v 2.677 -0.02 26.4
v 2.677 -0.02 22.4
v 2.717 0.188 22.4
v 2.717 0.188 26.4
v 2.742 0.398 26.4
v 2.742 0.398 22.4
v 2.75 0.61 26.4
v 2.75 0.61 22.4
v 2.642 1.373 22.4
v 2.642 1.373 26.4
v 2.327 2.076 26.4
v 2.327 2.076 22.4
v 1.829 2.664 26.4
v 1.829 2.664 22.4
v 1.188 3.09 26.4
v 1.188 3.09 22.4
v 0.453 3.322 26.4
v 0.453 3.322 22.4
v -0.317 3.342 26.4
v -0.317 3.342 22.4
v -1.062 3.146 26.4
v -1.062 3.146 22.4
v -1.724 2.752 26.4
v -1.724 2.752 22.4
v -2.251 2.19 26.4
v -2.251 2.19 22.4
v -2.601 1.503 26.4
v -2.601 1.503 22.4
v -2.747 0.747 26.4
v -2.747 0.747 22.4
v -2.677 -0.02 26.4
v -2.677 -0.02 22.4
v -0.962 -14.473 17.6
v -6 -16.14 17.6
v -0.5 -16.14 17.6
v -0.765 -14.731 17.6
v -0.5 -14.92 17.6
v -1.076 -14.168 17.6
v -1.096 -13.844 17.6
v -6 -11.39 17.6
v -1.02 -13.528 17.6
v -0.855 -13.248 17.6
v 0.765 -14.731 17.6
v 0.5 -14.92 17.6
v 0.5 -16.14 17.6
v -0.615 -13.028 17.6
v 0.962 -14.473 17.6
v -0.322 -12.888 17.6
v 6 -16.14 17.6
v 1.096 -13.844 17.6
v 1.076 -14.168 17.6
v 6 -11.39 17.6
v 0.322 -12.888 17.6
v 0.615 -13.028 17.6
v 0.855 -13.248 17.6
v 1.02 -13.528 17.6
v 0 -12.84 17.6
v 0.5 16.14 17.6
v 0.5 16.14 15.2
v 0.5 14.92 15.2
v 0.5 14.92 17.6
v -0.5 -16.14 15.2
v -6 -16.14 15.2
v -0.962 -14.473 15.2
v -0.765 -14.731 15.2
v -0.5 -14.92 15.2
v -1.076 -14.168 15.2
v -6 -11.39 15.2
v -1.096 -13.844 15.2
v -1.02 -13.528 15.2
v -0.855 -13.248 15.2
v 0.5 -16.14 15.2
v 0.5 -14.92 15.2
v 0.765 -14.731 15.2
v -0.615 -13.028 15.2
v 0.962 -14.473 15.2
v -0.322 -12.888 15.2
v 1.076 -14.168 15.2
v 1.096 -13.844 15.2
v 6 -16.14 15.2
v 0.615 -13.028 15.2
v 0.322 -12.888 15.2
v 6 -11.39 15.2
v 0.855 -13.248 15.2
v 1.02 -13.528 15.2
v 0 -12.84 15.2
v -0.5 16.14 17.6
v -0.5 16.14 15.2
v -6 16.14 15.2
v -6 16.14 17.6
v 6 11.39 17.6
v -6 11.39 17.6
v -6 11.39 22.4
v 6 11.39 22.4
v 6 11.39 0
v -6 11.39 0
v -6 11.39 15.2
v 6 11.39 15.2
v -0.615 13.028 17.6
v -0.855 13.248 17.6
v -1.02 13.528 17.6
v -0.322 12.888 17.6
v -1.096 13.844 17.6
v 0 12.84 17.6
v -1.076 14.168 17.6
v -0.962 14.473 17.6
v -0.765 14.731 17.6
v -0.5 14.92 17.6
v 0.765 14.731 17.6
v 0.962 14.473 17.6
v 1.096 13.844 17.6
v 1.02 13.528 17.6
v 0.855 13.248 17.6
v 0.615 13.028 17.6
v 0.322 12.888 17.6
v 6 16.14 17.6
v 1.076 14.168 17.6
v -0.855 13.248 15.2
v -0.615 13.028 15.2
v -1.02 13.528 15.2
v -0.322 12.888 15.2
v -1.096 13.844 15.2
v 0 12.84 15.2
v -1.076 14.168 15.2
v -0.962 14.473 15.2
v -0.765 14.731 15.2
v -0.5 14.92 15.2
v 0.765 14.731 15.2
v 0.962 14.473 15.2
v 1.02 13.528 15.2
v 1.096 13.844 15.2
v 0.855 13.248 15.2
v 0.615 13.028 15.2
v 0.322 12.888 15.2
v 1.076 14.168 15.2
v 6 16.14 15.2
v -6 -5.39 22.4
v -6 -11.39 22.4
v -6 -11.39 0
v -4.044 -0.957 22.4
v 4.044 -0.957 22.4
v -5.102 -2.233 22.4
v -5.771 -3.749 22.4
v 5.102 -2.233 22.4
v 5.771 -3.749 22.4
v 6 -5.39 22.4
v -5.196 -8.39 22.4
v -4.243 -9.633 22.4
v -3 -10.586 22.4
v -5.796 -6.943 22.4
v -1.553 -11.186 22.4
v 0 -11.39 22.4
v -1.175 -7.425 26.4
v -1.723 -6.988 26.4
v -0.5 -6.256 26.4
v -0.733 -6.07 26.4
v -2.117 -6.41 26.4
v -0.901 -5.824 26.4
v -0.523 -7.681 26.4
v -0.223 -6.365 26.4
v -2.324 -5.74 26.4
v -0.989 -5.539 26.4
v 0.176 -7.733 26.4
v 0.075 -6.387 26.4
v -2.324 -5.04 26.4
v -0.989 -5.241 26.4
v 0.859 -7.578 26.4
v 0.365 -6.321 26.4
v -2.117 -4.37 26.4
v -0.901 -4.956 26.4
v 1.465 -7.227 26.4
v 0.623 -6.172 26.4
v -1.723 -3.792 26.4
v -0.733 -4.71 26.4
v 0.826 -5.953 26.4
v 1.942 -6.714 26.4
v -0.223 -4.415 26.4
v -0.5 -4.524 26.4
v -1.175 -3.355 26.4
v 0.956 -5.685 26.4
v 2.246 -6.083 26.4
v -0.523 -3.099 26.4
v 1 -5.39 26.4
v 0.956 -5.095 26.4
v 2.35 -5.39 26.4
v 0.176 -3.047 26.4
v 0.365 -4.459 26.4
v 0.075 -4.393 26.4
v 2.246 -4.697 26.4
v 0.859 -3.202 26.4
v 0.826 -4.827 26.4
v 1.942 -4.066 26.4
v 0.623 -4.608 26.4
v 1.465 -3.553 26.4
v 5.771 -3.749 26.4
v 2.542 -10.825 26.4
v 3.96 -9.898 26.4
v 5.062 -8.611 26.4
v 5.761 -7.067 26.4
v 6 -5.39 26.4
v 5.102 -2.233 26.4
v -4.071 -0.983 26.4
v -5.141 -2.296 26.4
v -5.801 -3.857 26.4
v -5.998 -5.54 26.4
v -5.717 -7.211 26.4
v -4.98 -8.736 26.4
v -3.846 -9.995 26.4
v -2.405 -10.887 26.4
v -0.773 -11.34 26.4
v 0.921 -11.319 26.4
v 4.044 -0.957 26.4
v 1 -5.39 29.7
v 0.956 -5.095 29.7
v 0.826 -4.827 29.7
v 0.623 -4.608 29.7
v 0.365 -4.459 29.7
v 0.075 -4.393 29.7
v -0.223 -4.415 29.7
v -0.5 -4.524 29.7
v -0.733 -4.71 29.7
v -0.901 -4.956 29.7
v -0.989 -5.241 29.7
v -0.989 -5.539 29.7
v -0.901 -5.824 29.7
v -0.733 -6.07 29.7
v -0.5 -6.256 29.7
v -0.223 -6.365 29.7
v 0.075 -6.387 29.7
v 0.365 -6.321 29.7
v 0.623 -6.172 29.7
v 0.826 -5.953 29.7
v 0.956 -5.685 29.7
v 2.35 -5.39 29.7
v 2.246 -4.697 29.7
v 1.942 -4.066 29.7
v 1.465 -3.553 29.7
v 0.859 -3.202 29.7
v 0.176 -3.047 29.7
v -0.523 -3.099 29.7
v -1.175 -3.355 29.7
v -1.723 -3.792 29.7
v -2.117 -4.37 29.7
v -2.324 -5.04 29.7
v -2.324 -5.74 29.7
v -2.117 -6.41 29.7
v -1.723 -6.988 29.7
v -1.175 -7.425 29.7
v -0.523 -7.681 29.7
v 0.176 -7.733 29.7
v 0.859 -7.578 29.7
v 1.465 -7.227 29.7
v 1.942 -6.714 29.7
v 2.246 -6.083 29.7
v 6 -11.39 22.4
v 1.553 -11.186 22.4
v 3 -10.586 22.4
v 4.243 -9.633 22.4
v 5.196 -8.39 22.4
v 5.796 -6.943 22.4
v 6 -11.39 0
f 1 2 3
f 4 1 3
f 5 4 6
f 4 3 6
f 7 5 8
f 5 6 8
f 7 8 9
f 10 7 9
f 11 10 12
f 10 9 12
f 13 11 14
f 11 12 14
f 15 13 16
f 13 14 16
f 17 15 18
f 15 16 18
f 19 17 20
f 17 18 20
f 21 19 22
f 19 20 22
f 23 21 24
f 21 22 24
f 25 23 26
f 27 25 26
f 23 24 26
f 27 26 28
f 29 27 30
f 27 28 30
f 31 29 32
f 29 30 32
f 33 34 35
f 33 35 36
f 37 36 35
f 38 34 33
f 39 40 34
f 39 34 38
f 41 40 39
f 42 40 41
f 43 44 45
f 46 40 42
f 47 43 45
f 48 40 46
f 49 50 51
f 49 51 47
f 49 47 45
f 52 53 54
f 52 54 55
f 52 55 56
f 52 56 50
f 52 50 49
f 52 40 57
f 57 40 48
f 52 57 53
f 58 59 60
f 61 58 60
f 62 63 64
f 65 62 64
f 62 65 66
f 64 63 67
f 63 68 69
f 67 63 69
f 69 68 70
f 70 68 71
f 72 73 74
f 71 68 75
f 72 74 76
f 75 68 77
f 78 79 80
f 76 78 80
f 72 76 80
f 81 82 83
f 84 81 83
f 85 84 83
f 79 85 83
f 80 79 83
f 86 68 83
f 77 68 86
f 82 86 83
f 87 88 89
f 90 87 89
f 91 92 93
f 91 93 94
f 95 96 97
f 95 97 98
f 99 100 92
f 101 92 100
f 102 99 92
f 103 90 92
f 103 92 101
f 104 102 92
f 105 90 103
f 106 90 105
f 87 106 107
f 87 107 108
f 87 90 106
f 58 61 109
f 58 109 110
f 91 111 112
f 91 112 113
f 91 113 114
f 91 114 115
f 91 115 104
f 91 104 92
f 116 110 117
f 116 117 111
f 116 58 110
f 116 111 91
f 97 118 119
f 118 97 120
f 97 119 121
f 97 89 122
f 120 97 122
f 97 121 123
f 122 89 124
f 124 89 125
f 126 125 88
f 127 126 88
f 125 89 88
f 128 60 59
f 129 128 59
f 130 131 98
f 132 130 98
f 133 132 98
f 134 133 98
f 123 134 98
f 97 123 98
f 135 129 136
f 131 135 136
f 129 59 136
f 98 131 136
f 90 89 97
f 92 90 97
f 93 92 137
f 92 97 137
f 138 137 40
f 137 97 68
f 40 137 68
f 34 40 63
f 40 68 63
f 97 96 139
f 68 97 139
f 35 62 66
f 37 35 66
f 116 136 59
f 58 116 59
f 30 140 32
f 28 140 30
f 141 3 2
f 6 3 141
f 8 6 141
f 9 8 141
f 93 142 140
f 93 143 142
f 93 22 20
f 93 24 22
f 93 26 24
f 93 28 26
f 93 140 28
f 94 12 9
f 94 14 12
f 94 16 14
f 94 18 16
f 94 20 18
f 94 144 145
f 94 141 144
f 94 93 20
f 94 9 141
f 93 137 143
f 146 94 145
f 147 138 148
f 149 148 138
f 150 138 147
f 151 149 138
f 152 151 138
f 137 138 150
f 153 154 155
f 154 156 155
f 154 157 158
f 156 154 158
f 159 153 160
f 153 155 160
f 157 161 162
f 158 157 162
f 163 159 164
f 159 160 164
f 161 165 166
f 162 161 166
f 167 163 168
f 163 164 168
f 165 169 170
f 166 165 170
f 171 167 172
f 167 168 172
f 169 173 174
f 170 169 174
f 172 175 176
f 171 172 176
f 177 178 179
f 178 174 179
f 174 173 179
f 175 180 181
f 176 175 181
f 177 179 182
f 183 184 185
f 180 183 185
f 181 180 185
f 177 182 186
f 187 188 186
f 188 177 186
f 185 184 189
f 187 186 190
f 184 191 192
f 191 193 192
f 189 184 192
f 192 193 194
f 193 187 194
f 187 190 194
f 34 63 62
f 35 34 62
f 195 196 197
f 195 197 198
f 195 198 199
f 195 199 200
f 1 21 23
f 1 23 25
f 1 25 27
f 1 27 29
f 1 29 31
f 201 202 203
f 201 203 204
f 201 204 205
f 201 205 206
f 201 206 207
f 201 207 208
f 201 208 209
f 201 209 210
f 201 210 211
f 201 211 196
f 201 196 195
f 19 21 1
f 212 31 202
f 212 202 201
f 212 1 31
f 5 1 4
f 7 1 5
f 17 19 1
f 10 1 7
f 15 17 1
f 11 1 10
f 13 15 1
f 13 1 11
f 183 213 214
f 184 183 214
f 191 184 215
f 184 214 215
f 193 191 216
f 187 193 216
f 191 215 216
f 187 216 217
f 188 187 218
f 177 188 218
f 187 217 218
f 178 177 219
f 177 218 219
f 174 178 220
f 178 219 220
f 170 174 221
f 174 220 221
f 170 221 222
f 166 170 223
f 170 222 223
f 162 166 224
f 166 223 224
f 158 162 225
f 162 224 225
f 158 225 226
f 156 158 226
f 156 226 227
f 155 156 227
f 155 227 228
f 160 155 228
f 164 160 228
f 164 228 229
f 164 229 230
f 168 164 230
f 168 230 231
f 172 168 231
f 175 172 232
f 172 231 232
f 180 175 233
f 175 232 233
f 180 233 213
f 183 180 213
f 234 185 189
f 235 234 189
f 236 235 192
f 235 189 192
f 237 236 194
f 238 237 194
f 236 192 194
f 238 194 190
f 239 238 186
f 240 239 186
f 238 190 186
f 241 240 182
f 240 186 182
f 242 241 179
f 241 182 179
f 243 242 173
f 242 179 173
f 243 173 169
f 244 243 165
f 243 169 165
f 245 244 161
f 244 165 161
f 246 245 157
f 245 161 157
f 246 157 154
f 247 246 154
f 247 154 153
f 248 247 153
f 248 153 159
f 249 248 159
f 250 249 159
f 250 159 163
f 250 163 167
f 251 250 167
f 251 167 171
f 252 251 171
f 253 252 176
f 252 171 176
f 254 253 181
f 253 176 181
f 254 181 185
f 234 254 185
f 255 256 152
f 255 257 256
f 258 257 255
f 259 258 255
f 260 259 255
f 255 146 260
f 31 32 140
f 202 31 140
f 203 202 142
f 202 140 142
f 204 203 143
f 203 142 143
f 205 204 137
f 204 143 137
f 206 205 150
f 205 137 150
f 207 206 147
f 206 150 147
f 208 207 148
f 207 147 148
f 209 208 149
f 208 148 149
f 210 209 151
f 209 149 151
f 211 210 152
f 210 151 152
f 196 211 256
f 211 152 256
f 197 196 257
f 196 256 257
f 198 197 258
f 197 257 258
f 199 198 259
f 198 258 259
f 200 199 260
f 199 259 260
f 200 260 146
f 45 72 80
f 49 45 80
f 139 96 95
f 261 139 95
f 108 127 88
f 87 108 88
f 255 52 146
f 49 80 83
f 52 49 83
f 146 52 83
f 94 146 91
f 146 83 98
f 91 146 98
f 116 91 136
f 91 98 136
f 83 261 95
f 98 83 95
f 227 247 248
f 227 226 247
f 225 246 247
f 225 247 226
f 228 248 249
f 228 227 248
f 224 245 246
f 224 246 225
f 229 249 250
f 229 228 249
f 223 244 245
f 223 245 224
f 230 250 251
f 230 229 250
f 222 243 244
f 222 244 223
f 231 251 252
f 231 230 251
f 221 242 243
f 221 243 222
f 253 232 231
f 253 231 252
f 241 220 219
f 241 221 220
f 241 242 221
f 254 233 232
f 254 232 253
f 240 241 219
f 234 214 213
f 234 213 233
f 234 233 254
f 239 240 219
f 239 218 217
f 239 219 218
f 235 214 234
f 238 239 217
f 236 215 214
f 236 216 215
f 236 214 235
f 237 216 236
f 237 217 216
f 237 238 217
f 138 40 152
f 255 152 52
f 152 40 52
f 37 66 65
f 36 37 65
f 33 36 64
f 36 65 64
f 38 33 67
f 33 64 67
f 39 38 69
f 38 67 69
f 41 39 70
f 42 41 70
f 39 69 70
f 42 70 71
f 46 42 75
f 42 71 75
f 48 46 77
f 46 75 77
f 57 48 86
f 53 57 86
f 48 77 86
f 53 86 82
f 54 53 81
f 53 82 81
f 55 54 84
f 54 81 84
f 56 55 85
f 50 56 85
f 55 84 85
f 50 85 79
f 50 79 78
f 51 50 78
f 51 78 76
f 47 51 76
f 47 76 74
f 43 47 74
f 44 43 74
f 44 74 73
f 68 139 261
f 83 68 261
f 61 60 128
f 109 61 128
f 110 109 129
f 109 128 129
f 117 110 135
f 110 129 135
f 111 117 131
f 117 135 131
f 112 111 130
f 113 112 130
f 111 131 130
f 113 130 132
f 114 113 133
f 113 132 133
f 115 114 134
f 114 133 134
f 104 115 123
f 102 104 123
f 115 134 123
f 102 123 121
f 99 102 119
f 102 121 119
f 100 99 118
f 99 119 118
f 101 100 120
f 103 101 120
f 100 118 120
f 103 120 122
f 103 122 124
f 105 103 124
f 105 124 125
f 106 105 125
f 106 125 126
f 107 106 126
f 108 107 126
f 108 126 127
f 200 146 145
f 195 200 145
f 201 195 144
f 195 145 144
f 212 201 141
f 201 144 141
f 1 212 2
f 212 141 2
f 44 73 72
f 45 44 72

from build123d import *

# Parameters (mm, degrees)
F0_W      = 12
F0_H      = 22.78
F1_DEPTH  = 15.2
F2_W      = 12
F2_H      = 22.78
F3_DEPTH  = 2.4
F4_W      = 12
F4_H      = 22.78
F5_DEPTH  = 4.8
F7_DEPTH  = 4
F8_R      = 2.35
F9_DEPTH  = 3.3
F10_R     = 1
F11_DEPTH = 3.3


with BuildPart() as f1:
    # F0 (on Top) → F1 (new body)
    with BuildSketch(Plane.XY):
        Rectangle(F0_W, F0_H)
    extrude(amount=F1_DEPTH)

    # F2 (on face) → F3 (join)
    with BuildSketch(Plane.XY.offset(15.2)):
        with BuildLine():
            Line((-6, 16.14), (-6, 11.39))
            Line((-6, 11.39), (6, 11.39))
            Line((6, 11.39), (6, 16.14))
            Line((6, 16.14), (0.5, 16.14))
            Line((0.5, 16.14), (0.5, 14.9197958971))
            ThreePointArc((0.5, 14.9197958971), (0, 12.84), (-0.5, 14.9197958971))
            Line((-0.5, 14.9197958971), (-0.5, 16.14))
            Line((-0.5, 16.14), (-6, 16.14))
        make_face()
        Rectangle(F2_W, F2_H)
        with BuildLine():
            Line((6, -11.39), (-6, -11.39))
            Line((-6, -11.39), (-6, -16.14))
            Line((-6, -16.14), (-0.5, -16.14))
            Line((-0.5, -16.14), (-0.5, -14.9197958971))
            ThreePointArc((-0.5, -14.9197958971), (0, -12.84), (0.5, -14.9197958971))
            Line((0.5, -14.9197958971), (0.5, -16.14))
            Line((0.5, -16.14), (6, -16.14))
            Line((6, -16.14), (6, -11.39))
        make_face()
    extrude(amount=F3_DEPTH)

    # F4 (on face) → F5 (join)
    with BuildSketch(Plane.XY.offset(17.6)):
        Rectangle(F4_W, F4_H)
    extrude(amount=F5_DEPTH)

    # F6 (on face) → F7 (join)
    with BuildSketch(Plane.XY.offset(22.4)):
        with BuildLine():
            ThreePointArc((-2.6768147968, -0.0202083333), (-3.15746031, -10.4920039583), (6, -5.39))
            ThreePointArc((6, -5.39), (5.1020039583, -2.23253969), (2.6768147968, -0.0202083333))
            ThreePointArc((2.6768147968, -0.0202083333), (0, -2.14), (-2.6768147968, -0.0202083333))
        make_face()
        with BuildLine():
            ThreePointArc((-2.6768147968, -0.0202083333), (0, -2.14), (2.6768147968, -0.0202083333))
            ThreePointArc((2.6768147968, -0.0202083333), (0, 0.61), (-2.6768147968, -0.0202083333))
        make_face()
        with BuildLine():
            ThreePointArc((-2.6768147968, -0.0202083333), (0, 0.61), (2.6768147968, -0.0202083333))
            ThreePointArc((2.6768147968, -0.0202083333), (2.7316424264, 0.2927782253), (2.75, 0.61))
            ThreePointArc((2.75, 0.61), (-0.3172217747, 3.3416424264), (-2.6768147968, -0.0202083333))
        make_face()
    extrude(amount=F7_DEPTH)


with BuildPart() as f9:
    # F8 (on face) → F9 (new body)
    with BuildSketch(Plane.XY.offset(26.4)):
        with Locations((0, -5.39)):
            Circle(F8_R)
    extrude(amount=F9_DEPTH)

    # F10 (on face) → F11 (cut, through all)
    with BuildSketch(Plane.XY.offset(29.7)):
        with Locations((0, -5.39)):
            Circle(F10_R)
    extrude(amount=-F11_DEPTH, mode=Mode.SUBTRACT)


solid = Compound([f1.part, f9.part])
